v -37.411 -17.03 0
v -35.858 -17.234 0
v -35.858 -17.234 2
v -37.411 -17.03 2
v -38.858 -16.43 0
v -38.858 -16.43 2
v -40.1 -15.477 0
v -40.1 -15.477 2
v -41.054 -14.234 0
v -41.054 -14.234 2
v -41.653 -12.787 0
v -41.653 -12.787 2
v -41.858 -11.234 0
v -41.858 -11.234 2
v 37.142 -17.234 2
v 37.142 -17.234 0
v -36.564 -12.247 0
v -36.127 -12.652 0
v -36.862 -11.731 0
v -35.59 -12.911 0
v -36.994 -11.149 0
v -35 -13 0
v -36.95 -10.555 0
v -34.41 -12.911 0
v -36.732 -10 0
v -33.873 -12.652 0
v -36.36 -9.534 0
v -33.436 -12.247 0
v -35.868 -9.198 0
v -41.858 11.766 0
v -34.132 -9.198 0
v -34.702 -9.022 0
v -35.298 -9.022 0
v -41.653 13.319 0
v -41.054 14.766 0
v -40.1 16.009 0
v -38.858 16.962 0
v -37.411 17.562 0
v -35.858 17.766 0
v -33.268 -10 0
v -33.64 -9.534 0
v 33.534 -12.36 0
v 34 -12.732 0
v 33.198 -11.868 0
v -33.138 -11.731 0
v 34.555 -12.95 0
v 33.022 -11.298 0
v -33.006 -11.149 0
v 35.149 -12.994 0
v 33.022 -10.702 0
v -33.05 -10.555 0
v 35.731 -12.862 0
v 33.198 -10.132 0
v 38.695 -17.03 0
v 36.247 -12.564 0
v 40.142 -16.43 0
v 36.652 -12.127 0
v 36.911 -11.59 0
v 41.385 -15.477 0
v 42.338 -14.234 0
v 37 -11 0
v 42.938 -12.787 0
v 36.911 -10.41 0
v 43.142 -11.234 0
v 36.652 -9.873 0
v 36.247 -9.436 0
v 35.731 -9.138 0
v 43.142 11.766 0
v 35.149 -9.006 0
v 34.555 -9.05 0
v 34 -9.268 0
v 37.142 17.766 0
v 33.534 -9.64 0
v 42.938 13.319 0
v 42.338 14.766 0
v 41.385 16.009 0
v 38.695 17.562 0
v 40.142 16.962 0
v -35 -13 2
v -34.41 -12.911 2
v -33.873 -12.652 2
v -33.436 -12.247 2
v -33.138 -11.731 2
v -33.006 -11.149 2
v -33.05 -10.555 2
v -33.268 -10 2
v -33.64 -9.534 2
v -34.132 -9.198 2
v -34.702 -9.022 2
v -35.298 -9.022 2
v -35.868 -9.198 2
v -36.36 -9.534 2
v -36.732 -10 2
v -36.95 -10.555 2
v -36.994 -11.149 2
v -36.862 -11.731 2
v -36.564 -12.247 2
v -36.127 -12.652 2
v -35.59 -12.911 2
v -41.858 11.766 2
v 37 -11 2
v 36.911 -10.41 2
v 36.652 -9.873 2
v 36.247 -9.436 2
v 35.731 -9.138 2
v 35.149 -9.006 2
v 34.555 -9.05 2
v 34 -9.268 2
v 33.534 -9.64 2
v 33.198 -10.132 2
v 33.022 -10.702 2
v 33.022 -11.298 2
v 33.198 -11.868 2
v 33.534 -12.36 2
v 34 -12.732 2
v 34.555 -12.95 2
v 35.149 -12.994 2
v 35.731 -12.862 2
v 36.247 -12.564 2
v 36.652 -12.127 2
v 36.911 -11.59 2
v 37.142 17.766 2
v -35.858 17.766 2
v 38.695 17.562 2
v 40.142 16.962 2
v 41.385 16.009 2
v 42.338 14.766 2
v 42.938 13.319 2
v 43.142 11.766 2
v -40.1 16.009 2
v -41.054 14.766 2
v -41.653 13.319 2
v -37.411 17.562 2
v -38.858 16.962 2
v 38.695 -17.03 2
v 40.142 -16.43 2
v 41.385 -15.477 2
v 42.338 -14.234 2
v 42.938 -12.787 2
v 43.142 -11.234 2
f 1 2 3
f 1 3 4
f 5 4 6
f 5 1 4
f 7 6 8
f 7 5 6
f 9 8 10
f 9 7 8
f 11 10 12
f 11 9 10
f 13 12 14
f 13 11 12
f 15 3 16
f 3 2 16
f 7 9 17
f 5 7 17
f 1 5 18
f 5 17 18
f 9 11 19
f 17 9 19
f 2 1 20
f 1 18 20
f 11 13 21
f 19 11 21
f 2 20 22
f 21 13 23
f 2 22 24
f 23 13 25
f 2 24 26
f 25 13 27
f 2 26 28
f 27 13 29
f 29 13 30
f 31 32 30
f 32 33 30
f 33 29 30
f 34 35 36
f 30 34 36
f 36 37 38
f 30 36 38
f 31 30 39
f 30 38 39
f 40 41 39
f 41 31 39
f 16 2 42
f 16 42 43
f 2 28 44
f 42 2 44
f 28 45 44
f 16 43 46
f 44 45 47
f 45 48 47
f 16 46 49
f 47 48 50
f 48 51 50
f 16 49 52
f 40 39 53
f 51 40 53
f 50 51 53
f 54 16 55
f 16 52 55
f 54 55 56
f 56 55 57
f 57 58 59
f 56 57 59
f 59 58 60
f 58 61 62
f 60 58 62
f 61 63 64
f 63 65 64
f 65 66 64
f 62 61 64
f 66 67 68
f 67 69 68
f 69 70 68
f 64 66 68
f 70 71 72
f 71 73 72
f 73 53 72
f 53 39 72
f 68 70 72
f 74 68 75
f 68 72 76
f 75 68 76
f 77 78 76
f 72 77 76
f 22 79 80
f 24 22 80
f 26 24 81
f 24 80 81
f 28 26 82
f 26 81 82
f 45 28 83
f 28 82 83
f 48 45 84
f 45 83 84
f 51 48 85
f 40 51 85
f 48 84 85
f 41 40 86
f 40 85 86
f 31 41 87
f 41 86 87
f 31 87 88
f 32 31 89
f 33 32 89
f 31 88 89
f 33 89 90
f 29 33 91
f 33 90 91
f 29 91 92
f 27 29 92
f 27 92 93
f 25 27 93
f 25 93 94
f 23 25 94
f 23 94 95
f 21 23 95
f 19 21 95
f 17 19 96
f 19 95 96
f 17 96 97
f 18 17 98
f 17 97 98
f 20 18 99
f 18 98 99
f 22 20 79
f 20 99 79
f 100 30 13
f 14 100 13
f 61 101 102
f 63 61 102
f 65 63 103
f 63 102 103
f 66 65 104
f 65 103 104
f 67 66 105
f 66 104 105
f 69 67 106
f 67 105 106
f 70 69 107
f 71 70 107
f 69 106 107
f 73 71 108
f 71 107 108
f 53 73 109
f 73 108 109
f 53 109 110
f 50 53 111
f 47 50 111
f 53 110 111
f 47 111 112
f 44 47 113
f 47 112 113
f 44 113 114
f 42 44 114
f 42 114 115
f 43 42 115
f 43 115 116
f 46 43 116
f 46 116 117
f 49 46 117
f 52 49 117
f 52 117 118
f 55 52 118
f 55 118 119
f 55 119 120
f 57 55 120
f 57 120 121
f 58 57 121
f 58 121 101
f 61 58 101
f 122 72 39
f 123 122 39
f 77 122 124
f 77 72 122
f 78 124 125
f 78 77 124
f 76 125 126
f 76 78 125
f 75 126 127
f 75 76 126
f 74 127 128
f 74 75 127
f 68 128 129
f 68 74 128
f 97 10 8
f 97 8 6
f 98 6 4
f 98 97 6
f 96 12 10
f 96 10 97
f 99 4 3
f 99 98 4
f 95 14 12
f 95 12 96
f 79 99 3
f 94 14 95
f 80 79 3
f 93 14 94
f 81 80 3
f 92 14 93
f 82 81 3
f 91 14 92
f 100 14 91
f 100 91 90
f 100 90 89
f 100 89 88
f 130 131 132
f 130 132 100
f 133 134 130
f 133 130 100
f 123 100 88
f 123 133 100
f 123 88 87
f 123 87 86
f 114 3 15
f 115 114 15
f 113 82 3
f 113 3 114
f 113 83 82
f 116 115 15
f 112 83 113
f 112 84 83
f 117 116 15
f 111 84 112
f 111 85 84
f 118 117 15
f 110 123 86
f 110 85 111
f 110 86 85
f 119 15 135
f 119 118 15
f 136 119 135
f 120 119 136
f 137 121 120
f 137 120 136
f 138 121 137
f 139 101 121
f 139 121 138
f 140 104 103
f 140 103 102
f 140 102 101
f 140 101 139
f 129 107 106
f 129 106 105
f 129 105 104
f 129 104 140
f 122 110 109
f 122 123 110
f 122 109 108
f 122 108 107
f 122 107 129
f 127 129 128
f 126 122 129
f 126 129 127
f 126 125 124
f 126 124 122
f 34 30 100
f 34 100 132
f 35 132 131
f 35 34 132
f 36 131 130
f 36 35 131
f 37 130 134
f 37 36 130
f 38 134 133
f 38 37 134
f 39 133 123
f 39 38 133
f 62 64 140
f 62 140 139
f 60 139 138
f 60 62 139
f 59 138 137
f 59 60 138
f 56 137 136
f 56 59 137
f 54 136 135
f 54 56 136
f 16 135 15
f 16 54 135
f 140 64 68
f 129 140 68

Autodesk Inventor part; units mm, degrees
ref_plane "YZ Plane" through (0, 0, 0) normal (1, 0, 0) x (0, 1, 0)
ref_plane "XZ Plane" through (0, 0, 0) normal (0, 1, 0) x (-1, 0, 0)
ref_plane "XY Plane" through (0, 0, 0) normal (0, 0, 1) x (1, 0, 0)
sketch "Sketch1" plane through (0, 0, 0) normal (0, 0, 1) x (1, 0, 0)
  line L0 (-35.8578, -17.234) -> (37.1422, -17.234)
  arc A0 (37.1422, -17.234) -> (43.1422, -11.234) centre (37.1422, -11.234) ccw
  line L1 (43.1422, -11.234) -> (43.1422, 11.766)
  arc A1 (43.1422, 11.766) -> (37.1422, 17.766) centre (37.1422, 11.766) ccw
  line L2 (37.1422, 17.766) -> (-35.8578, 17.766)
  arc A2 (-35.8578, 17.766) -> (-41.8578, 11.766) centre (-35.8578, 11.766) ccw
  line L3 (-41.8578, 11.766) -> (-41.8578, -11.234)
  arc A3 (-41.8578, -11.234) -> (-35.8578, -17.234) centre (-35.8578, -11.234) ccw
  arc A4 (41.1422, 12.766) -> (38.1422, 15.766) centre (38.1422, 12.766) ccw
  line L4 (41.1422, 12.766) -> (41.1422, -12.234)
  arc A5 (38.1422, -15.234) -> (41.1422, -12.234) centre (38.1422, -12.234) ccw
  line L5 (38.1422, -15.234) -> (-36.8578, -15.234)
  arc A6 (-39.8578, -12.234) -> (-36.8578, -15.234) centre (-36.8578, -12.234) ccw
  line L6 (-39.8578, -12.234) -> (-39.8578, 12.766)
  arc A7 (-36.8578, 15.766) -> (-39.8578, 12.766) centre (-36.8578, 12.766) ccw
  line L7 (-36.8578, 15.766) -> (38.1422, 15.766)
  point P0 (0, 0)
  point P1 (0.6422, 0.266)
extrude "Extrusion1" add sketch "Sketch1" along normal blind 2 contours A3 L3 A2 L2 A1 L1 A0 L0 | L4 A5 L5 A6 L6 A7 L7 A4
sketch "Sketch2" plane through (0, 0, 2) normal (0, 0, 1) x (1, 0, 0)
  line L0 (0, 0) -> (-35, 0)
  line L1 (-35, 0) -> (-35, -11)
  line L2 (-35, -11) -> (35, -11)
  line L3 (-35, -9) -> (-35, -9)
  line L4 (-33, -11) -> (-33, -11)
  line L5 (-35, -13) -> (-35, -13)
  line L6 (-37, -11) -> (-37, -11)
  line L7 (-37, -9) -> (-33, -13) construction
  line L8 (-33, -9) -> (-37, -13) construction
  line L9 (35, -9) -> (35, -9)
  line L10 (37, -11) -> (37, -11)
  line L11 (35, -13) -> (35, -13)
  line L12 (33, -11) -> (33, -11)
  line L13 (33, -9) -> (37, -13) construction
  line L14 (37, -9) -> (33, -13) construction
  arc A0 (35, -9) -> (33, -11) centre (35, -11) ccw
  arc A1 (37, -11) -> (35, -9) centre (35, -11) ccw
  arc A2 (33, -11) -> (35, -13) centre (35, -11) ccw
  arc A3 (35, -13) -> (37, -11) centre (35, -11) ccw
  arc A4 (-33, -11) -> (-35, -9) centre (-35, -11) ccw
  arc A5 (-35, -13) -> (-33, -11) centre (-35, -11) ccw
  arc A6 (-37, -11) -> (-35, -13) centre (-35, -11) ccw
  arc A7 (-35, -9) -> (-37, -11) centre (-35, -11) ccw
  dimension "d2" = 35
  dimension "d3" = 11
  dimension "d4" = 70
  dimension "d5" = 4
  dimension "d6" = 4
  dimension "d7" = 4
  dimension "d8" = 4
  dimension "d9" = 2
extrude "Extrusion2" cut sketch "Sketch2" against normal blind 2
properties part number "CASE_1"
